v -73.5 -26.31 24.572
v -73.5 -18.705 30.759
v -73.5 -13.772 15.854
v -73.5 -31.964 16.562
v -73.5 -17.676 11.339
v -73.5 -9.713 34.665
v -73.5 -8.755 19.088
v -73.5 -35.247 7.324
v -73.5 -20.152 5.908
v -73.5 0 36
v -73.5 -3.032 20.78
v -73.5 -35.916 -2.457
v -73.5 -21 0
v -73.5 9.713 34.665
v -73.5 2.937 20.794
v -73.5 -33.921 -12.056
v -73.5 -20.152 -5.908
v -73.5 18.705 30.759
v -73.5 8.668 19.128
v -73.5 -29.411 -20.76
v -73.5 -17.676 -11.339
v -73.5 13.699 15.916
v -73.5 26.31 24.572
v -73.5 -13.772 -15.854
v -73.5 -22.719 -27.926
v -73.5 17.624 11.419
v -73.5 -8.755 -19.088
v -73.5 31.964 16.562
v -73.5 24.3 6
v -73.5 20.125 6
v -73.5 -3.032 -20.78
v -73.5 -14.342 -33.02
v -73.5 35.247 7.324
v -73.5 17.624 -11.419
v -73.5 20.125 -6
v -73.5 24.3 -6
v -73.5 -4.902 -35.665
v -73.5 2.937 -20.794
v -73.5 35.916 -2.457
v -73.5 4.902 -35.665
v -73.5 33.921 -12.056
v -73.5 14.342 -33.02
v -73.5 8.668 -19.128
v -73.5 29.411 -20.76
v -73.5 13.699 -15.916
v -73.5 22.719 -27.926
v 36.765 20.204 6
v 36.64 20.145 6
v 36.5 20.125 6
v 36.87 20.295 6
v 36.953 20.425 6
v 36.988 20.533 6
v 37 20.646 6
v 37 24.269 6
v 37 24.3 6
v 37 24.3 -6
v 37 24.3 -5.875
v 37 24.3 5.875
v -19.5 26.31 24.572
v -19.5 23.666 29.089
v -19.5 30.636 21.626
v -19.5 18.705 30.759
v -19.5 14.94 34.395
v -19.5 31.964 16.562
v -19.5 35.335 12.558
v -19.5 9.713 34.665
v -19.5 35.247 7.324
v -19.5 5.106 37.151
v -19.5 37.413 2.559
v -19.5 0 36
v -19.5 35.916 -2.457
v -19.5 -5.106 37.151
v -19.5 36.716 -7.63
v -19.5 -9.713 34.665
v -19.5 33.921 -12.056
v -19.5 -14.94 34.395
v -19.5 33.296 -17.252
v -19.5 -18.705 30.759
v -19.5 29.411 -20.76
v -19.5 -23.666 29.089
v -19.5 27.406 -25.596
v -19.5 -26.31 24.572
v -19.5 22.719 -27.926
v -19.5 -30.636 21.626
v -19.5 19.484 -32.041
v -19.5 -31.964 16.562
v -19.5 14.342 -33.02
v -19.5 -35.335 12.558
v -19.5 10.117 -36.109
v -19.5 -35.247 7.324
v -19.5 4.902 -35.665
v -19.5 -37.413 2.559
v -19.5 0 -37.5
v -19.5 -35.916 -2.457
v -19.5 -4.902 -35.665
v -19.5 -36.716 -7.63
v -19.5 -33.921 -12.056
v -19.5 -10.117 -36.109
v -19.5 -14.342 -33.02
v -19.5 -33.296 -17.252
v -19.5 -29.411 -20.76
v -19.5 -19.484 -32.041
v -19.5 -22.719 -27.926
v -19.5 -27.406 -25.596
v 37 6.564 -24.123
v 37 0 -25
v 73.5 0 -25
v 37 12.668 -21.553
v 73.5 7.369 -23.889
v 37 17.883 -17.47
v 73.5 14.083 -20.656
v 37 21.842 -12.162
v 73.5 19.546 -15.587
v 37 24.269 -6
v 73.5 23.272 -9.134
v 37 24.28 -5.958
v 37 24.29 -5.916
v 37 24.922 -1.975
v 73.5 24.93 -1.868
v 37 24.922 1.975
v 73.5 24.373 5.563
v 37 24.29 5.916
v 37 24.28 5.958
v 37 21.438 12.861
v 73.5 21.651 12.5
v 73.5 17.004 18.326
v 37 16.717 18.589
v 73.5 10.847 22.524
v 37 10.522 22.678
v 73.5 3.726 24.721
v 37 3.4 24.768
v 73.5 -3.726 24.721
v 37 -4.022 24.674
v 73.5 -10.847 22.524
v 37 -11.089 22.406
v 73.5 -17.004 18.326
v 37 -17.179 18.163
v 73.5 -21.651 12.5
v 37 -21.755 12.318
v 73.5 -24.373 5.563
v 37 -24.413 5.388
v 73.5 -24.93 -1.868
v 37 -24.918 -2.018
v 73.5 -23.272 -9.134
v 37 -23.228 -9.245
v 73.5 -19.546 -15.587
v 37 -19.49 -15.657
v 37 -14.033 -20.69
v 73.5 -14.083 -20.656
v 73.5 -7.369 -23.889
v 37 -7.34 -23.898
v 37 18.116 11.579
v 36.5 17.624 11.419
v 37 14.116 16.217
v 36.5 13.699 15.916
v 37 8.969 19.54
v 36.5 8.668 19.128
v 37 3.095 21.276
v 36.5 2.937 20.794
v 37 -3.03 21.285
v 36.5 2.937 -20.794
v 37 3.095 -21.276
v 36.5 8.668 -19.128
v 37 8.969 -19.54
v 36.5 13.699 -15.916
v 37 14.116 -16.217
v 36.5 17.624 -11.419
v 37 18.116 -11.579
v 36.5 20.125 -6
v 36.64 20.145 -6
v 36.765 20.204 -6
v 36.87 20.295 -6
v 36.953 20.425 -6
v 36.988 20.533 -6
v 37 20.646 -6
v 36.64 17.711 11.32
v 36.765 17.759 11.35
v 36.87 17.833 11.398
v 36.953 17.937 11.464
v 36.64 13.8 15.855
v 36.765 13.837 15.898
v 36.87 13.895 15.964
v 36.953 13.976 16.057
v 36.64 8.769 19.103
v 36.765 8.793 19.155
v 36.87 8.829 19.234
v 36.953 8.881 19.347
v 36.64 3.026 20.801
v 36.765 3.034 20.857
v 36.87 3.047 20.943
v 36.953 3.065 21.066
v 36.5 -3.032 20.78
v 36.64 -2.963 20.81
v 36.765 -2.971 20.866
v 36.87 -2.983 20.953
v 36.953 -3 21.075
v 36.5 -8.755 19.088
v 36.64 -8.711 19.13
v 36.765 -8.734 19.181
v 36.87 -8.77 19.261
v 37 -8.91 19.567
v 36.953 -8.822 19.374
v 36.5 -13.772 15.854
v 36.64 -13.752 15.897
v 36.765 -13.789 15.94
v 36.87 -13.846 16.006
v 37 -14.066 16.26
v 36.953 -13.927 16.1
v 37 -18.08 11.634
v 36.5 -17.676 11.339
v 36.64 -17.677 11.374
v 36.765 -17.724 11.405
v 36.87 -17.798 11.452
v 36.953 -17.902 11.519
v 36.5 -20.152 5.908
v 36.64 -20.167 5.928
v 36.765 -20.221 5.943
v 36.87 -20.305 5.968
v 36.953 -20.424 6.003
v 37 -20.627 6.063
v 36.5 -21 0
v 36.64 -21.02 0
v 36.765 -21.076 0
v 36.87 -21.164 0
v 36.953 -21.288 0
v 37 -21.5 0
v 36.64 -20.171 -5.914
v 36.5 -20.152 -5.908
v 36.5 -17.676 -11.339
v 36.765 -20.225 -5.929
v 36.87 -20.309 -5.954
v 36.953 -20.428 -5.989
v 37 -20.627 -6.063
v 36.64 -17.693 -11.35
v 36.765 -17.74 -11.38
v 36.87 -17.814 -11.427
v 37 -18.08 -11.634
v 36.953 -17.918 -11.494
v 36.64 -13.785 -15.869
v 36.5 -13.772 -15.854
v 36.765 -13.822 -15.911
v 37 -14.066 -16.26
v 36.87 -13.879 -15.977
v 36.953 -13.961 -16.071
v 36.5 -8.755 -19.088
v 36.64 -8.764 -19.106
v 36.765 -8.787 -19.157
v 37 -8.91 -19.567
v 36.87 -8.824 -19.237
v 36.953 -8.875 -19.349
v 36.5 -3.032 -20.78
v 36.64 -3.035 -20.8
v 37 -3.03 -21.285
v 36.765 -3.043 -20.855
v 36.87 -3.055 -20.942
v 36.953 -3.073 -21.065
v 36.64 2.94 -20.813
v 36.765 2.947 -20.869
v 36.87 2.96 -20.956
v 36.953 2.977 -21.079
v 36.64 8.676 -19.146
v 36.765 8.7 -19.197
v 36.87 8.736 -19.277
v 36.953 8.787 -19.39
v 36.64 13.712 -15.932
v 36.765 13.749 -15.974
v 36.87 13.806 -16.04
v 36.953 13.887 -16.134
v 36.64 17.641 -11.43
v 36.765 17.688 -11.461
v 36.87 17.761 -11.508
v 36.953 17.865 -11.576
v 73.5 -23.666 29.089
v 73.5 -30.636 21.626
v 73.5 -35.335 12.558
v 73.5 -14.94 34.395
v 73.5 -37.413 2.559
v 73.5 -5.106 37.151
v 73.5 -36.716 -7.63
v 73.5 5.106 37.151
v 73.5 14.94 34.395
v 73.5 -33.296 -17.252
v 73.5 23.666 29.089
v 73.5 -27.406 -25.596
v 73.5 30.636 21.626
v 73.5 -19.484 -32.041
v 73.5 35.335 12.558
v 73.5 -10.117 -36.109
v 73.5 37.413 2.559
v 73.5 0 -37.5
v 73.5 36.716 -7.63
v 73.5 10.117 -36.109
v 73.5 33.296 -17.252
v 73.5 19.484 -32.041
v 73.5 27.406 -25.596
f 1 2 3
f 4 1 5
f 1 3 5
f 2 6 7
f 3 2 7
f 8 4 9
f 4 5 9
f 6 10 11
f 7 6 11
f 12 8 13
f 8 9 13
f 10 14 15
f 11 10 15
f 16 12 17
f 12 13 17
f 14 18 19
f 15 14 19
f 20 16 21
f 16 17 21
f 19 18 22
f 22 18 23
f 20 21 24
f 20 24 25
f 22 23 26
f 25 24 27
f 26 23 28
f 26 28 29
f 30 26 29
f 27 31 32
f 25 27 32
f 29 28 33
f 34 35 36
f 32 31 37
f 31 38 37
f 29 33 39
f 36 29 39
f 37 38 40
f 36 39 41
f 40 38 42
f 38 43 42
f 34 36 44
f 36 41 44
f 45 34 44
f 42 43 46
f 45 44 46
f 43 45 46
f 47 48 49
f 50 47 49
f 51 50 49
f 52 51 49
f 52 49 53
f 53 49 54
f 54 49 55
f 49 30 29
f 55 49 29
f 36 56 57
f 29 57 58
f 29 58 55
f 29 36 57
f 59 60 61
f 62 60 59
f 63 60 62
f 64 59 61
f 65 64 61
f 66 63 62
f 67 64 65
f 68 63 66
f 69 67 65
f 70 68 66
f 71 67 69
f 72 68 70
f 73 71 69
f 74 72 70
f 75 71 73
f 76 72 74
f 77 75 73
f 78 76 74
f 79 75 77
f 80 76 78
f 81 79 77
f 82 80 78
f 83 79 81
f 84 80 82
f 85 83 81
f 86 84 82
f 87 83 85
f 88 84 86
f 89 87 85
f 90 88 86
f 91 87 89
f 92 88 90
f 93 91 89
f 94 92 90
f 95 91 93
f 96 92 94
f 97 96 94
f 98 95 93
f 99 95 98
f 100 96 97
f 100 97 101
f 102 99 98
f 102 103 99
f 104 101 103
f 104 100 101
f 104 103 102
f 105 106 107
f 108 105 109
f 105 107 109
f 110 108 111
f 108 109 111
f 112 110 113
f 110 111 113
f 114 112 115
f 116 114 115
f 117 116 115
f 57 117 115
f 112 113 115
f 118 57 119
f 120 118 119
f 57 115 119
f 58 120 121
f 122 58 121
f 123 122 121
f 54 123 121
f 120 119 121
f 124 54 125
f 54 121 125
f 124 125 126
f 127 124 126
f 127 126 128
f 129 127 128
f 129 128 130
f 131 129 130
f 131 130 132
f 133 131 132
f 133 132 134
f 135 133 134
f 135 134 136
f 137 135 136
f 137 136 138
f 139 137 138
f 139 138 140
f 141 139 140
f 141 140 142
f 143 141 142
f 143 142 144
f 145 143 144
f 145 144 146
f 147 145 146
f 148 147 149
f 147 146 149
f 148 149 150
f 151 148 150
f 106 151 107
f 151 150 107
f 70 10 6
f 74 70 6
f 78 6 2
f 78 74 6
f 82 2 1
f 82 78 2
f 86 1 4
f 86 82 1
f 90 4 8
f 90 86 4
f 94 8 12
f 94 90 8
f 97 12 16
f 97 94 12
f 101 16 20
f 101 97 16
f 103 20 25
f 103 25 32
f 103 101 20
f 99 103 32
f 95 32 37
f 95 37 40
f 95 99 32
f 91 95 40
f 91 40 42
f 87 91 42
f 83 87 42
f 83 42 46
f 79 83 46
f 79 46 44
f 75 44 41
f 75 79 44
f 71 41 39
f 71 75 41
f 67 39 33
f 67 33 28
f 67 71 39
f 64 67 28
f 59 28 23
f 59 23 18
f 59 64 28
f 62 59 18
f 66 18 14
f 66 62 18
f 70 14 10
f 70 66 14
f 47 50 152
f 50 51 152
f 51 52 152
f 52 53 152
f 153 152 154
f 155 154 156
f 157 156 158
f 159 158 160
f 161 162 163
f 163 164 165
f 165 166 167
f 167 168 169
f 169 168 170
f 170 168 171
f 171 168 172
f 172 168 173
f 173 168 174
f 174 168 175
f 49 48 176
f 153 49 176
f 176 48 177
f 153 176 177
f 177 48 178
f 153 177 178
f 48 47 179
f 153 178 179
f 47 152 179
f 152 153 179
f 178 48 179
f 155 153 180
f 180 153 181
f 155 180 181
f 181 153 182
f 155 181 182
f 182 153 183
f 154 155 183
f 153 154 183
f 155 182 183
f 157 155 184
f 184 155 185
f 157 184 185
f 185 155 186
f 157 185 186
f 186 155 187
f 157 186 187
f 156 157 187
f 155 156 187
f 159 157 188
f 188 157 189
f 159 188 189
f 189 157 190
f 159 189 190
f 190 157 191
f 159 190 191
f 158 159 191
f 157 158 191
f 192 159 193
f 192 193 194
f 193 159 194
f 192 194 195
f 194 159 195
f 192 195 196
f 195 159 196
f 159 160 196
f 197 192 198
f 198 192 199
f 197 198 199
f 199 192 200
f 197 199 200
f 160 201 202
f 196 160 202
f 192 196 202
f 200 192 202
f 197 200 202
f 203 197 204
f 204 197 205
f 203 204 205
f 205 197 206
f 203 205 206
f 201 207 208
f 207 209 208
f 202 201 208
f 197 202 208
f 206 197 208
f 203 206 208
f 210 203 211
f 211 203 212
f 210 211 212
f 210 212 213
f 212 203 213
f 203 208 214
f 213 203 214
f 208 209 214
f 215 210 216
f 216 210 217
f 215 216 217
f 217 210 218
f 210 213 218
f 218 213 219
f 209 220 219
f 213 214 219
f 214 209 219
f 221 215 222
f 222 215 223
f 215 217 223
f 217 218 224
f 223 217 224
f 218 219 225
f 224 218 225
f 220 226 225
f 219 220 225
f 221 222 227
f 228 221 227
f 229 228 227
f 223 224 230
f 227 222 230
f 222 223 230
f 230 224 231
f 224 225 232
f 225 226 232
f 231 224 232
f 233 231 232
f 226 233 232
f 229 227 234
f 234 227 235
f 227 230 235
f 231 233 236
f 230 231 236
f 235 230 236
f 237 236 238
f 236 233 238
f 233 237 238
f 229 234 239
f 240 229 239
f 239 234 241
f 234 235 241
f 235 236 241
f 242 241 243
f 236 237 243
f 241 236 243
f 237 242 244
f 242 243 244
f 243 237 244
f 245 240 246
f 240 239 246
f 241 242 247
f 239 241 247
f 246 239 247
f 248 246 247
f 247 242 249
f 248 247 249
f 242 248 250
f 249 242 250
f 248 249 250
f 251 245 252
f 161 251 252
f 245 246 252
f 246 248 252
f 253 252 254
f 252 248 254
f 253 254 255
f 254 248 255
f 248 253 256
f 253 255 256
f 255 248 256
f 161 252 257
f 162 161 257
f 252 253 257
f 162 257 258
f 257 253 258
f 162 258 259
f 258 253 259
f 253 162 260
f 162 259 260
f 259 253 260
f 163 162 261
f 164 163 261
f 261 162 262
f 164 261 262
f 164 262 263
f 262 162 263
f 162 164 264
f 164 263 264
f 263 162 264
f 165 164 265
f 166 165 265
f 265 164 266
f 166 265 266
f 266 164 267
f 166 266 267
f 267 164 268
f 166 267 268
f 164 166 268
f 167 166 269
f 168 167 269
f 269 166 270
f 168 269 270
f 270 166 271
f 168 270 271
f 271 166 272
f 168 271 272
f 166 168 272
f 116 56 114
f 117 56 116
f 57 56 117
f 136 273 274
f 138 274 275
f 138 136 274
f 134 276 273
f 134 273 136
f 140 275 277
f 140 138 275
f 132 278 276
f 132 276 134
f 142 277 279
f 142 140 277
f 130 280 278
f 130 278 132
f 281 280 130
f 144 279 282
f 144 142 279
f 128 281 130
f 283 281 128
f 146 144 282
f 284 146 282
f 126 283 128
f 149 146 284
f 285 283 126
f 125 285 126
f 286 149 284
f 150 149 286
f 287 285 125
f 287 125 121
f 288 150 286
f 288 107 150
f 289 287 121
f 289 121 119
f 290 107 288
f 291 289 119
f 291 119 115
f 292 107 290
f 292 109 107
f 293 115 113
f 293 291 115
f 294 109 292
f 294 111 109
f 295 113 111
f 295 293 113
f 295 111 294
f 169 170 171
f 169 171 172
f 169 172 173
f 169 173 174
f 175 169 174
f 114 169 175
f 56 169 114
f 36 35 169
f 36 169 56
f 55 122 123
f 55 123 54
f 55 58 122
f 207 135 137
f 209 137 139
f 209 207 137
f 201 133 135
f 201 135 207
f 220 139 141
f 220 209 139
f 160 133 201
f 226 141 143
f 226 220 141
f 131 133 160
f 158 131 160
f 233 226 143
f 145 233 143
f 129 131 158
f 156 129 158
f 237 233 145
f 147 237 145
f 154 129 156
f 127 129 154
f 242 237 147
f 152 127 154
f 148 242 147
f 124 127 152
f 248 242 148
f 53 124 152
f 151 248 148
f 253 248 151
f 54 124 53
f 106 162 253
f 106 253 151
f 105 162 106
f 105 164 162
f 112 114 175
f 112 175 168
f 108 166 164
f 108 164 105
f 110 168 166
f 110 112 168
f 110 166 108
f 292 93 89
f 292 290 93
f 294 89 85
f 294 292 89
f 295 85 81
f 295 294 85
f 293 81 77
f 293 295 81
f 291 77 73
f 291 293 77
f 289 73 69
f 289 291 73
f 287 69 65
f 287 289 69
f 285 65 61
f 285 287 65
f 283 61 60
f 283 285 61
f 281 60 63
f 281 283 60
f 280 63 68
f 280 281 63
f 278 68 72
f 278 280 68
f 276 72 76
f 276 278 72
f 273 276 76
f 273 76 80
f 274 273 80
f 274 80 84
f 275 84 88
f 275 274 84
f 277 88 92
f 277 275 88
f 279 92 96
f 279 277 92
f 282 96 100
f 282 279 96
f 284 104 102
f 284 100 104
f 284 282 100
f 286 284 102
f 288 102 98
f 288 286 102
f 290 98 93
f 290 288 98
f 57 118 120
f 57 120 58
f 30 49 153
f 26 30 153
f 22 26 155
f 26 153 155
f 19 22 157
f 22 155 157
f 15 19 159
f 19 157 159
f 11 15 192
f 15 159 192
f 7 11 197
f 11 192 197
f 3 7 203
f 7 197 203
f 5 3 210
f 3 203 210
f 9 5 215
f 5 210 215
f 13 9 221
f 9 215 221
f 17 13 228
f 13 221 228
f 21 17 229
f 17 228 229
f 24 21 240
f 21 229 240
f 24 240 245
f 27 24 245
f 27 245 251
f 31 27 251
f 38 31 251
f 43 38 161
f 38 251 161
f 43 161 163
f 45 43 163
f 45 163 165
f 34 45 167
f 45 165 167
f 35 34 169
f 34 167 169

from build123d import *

# Parameters (mm, degrees)
SKETCH1_R           = 37.5
BOSS_EXTRUDE1_DEPTH = 73.5
SKETCH2_R           = 21
CUT_EXTRUDE1_DEPTH  = 157.273798188
SKETCH3_R           = 25
CUT_EXTRUDE2_DEPTH  = 36.5
SKETCH4_W           = 12
SKETCH4_H           = 20.96554604
CUT_EXTRUDE3_DEPTH  = 110.5
FILLET1_R           = 0.5
SKETCH5_W           = 54
SKETCH5_H           = 1.5


with BuildPart() as part:
    # Sketch1 → Boss-Extrude1 (new, symmetric)
    with BuildSketch(Plane(origin=(0, 0, 0), x_dir=(0, 0, -1), z_dir=(1, 0, 0))):
        Circle(SKETCH1_R)
    extrude(amount=BOSS_EXTRUDE1_DEPTH, both=True)

    # Sketch2 → Cut-Extrude1 (cut, through all)
    with BuildSketch(Plane(origin=(73.5, 0, 0), x_dir=(0, 0, -1), z_dir=(1, 0, 0))):
        Circle(SKETCH2_R)
    extrude(amount=-CUT_EXTRUDE1_DEPTH, mode=Mode.SUBTRACT)

    # Sketch3 → Cut-Extrude2 (cut)
    with BuildSketch(Plane(origin=(73.5, 0, 0), x_dir=(0, 0, -1), z_dir=(1, 0, 0))):
        Circle(SKETCH3_R)
    extrude(amount=-CUT_EXTRUDE2_DEPTH, mode=Mode.SUBTRACT)

    # Sketch4 → Cut-Extrude3 (cut)
    with BuildSketch(Plane.ZY.offset(73.5)):
        with Locations((0, 13.81722698)):
            Rectangle(SKETCH4_W, SKETCH4_H)
    extrude(amount=-CUT_EXTRUDE3_DEPTH, mode=Mode.SUBTRACT)

    # Fillet1
    fillet1_edges = [part.edges().sort_by_distance(p)[0] for p in [
        (37, -21, 0),
    ]]
    fillet(fillet1_edges, radius=FILLET1_R)

    # Sketch5 → Cut-Revolve1 (revolve, cut)
    with BuildSketch(Plane.XY, mode=Mode.PRIVATE) as cut_revolve1_sk:
        with Locations((-46.5, 36.75)):
            Rectangle(SKETCH5_W, SKETCH5_H)
    revolve(cut_revolve1_sk.sketch.rotate(Axis((-73.5, 0, 0), (1, 0, 0)), 90), axis=Axis((-73.5, 0, 0), (1, 0, 0)), mode=Mode.SUBTRACT)


solid = part.part
